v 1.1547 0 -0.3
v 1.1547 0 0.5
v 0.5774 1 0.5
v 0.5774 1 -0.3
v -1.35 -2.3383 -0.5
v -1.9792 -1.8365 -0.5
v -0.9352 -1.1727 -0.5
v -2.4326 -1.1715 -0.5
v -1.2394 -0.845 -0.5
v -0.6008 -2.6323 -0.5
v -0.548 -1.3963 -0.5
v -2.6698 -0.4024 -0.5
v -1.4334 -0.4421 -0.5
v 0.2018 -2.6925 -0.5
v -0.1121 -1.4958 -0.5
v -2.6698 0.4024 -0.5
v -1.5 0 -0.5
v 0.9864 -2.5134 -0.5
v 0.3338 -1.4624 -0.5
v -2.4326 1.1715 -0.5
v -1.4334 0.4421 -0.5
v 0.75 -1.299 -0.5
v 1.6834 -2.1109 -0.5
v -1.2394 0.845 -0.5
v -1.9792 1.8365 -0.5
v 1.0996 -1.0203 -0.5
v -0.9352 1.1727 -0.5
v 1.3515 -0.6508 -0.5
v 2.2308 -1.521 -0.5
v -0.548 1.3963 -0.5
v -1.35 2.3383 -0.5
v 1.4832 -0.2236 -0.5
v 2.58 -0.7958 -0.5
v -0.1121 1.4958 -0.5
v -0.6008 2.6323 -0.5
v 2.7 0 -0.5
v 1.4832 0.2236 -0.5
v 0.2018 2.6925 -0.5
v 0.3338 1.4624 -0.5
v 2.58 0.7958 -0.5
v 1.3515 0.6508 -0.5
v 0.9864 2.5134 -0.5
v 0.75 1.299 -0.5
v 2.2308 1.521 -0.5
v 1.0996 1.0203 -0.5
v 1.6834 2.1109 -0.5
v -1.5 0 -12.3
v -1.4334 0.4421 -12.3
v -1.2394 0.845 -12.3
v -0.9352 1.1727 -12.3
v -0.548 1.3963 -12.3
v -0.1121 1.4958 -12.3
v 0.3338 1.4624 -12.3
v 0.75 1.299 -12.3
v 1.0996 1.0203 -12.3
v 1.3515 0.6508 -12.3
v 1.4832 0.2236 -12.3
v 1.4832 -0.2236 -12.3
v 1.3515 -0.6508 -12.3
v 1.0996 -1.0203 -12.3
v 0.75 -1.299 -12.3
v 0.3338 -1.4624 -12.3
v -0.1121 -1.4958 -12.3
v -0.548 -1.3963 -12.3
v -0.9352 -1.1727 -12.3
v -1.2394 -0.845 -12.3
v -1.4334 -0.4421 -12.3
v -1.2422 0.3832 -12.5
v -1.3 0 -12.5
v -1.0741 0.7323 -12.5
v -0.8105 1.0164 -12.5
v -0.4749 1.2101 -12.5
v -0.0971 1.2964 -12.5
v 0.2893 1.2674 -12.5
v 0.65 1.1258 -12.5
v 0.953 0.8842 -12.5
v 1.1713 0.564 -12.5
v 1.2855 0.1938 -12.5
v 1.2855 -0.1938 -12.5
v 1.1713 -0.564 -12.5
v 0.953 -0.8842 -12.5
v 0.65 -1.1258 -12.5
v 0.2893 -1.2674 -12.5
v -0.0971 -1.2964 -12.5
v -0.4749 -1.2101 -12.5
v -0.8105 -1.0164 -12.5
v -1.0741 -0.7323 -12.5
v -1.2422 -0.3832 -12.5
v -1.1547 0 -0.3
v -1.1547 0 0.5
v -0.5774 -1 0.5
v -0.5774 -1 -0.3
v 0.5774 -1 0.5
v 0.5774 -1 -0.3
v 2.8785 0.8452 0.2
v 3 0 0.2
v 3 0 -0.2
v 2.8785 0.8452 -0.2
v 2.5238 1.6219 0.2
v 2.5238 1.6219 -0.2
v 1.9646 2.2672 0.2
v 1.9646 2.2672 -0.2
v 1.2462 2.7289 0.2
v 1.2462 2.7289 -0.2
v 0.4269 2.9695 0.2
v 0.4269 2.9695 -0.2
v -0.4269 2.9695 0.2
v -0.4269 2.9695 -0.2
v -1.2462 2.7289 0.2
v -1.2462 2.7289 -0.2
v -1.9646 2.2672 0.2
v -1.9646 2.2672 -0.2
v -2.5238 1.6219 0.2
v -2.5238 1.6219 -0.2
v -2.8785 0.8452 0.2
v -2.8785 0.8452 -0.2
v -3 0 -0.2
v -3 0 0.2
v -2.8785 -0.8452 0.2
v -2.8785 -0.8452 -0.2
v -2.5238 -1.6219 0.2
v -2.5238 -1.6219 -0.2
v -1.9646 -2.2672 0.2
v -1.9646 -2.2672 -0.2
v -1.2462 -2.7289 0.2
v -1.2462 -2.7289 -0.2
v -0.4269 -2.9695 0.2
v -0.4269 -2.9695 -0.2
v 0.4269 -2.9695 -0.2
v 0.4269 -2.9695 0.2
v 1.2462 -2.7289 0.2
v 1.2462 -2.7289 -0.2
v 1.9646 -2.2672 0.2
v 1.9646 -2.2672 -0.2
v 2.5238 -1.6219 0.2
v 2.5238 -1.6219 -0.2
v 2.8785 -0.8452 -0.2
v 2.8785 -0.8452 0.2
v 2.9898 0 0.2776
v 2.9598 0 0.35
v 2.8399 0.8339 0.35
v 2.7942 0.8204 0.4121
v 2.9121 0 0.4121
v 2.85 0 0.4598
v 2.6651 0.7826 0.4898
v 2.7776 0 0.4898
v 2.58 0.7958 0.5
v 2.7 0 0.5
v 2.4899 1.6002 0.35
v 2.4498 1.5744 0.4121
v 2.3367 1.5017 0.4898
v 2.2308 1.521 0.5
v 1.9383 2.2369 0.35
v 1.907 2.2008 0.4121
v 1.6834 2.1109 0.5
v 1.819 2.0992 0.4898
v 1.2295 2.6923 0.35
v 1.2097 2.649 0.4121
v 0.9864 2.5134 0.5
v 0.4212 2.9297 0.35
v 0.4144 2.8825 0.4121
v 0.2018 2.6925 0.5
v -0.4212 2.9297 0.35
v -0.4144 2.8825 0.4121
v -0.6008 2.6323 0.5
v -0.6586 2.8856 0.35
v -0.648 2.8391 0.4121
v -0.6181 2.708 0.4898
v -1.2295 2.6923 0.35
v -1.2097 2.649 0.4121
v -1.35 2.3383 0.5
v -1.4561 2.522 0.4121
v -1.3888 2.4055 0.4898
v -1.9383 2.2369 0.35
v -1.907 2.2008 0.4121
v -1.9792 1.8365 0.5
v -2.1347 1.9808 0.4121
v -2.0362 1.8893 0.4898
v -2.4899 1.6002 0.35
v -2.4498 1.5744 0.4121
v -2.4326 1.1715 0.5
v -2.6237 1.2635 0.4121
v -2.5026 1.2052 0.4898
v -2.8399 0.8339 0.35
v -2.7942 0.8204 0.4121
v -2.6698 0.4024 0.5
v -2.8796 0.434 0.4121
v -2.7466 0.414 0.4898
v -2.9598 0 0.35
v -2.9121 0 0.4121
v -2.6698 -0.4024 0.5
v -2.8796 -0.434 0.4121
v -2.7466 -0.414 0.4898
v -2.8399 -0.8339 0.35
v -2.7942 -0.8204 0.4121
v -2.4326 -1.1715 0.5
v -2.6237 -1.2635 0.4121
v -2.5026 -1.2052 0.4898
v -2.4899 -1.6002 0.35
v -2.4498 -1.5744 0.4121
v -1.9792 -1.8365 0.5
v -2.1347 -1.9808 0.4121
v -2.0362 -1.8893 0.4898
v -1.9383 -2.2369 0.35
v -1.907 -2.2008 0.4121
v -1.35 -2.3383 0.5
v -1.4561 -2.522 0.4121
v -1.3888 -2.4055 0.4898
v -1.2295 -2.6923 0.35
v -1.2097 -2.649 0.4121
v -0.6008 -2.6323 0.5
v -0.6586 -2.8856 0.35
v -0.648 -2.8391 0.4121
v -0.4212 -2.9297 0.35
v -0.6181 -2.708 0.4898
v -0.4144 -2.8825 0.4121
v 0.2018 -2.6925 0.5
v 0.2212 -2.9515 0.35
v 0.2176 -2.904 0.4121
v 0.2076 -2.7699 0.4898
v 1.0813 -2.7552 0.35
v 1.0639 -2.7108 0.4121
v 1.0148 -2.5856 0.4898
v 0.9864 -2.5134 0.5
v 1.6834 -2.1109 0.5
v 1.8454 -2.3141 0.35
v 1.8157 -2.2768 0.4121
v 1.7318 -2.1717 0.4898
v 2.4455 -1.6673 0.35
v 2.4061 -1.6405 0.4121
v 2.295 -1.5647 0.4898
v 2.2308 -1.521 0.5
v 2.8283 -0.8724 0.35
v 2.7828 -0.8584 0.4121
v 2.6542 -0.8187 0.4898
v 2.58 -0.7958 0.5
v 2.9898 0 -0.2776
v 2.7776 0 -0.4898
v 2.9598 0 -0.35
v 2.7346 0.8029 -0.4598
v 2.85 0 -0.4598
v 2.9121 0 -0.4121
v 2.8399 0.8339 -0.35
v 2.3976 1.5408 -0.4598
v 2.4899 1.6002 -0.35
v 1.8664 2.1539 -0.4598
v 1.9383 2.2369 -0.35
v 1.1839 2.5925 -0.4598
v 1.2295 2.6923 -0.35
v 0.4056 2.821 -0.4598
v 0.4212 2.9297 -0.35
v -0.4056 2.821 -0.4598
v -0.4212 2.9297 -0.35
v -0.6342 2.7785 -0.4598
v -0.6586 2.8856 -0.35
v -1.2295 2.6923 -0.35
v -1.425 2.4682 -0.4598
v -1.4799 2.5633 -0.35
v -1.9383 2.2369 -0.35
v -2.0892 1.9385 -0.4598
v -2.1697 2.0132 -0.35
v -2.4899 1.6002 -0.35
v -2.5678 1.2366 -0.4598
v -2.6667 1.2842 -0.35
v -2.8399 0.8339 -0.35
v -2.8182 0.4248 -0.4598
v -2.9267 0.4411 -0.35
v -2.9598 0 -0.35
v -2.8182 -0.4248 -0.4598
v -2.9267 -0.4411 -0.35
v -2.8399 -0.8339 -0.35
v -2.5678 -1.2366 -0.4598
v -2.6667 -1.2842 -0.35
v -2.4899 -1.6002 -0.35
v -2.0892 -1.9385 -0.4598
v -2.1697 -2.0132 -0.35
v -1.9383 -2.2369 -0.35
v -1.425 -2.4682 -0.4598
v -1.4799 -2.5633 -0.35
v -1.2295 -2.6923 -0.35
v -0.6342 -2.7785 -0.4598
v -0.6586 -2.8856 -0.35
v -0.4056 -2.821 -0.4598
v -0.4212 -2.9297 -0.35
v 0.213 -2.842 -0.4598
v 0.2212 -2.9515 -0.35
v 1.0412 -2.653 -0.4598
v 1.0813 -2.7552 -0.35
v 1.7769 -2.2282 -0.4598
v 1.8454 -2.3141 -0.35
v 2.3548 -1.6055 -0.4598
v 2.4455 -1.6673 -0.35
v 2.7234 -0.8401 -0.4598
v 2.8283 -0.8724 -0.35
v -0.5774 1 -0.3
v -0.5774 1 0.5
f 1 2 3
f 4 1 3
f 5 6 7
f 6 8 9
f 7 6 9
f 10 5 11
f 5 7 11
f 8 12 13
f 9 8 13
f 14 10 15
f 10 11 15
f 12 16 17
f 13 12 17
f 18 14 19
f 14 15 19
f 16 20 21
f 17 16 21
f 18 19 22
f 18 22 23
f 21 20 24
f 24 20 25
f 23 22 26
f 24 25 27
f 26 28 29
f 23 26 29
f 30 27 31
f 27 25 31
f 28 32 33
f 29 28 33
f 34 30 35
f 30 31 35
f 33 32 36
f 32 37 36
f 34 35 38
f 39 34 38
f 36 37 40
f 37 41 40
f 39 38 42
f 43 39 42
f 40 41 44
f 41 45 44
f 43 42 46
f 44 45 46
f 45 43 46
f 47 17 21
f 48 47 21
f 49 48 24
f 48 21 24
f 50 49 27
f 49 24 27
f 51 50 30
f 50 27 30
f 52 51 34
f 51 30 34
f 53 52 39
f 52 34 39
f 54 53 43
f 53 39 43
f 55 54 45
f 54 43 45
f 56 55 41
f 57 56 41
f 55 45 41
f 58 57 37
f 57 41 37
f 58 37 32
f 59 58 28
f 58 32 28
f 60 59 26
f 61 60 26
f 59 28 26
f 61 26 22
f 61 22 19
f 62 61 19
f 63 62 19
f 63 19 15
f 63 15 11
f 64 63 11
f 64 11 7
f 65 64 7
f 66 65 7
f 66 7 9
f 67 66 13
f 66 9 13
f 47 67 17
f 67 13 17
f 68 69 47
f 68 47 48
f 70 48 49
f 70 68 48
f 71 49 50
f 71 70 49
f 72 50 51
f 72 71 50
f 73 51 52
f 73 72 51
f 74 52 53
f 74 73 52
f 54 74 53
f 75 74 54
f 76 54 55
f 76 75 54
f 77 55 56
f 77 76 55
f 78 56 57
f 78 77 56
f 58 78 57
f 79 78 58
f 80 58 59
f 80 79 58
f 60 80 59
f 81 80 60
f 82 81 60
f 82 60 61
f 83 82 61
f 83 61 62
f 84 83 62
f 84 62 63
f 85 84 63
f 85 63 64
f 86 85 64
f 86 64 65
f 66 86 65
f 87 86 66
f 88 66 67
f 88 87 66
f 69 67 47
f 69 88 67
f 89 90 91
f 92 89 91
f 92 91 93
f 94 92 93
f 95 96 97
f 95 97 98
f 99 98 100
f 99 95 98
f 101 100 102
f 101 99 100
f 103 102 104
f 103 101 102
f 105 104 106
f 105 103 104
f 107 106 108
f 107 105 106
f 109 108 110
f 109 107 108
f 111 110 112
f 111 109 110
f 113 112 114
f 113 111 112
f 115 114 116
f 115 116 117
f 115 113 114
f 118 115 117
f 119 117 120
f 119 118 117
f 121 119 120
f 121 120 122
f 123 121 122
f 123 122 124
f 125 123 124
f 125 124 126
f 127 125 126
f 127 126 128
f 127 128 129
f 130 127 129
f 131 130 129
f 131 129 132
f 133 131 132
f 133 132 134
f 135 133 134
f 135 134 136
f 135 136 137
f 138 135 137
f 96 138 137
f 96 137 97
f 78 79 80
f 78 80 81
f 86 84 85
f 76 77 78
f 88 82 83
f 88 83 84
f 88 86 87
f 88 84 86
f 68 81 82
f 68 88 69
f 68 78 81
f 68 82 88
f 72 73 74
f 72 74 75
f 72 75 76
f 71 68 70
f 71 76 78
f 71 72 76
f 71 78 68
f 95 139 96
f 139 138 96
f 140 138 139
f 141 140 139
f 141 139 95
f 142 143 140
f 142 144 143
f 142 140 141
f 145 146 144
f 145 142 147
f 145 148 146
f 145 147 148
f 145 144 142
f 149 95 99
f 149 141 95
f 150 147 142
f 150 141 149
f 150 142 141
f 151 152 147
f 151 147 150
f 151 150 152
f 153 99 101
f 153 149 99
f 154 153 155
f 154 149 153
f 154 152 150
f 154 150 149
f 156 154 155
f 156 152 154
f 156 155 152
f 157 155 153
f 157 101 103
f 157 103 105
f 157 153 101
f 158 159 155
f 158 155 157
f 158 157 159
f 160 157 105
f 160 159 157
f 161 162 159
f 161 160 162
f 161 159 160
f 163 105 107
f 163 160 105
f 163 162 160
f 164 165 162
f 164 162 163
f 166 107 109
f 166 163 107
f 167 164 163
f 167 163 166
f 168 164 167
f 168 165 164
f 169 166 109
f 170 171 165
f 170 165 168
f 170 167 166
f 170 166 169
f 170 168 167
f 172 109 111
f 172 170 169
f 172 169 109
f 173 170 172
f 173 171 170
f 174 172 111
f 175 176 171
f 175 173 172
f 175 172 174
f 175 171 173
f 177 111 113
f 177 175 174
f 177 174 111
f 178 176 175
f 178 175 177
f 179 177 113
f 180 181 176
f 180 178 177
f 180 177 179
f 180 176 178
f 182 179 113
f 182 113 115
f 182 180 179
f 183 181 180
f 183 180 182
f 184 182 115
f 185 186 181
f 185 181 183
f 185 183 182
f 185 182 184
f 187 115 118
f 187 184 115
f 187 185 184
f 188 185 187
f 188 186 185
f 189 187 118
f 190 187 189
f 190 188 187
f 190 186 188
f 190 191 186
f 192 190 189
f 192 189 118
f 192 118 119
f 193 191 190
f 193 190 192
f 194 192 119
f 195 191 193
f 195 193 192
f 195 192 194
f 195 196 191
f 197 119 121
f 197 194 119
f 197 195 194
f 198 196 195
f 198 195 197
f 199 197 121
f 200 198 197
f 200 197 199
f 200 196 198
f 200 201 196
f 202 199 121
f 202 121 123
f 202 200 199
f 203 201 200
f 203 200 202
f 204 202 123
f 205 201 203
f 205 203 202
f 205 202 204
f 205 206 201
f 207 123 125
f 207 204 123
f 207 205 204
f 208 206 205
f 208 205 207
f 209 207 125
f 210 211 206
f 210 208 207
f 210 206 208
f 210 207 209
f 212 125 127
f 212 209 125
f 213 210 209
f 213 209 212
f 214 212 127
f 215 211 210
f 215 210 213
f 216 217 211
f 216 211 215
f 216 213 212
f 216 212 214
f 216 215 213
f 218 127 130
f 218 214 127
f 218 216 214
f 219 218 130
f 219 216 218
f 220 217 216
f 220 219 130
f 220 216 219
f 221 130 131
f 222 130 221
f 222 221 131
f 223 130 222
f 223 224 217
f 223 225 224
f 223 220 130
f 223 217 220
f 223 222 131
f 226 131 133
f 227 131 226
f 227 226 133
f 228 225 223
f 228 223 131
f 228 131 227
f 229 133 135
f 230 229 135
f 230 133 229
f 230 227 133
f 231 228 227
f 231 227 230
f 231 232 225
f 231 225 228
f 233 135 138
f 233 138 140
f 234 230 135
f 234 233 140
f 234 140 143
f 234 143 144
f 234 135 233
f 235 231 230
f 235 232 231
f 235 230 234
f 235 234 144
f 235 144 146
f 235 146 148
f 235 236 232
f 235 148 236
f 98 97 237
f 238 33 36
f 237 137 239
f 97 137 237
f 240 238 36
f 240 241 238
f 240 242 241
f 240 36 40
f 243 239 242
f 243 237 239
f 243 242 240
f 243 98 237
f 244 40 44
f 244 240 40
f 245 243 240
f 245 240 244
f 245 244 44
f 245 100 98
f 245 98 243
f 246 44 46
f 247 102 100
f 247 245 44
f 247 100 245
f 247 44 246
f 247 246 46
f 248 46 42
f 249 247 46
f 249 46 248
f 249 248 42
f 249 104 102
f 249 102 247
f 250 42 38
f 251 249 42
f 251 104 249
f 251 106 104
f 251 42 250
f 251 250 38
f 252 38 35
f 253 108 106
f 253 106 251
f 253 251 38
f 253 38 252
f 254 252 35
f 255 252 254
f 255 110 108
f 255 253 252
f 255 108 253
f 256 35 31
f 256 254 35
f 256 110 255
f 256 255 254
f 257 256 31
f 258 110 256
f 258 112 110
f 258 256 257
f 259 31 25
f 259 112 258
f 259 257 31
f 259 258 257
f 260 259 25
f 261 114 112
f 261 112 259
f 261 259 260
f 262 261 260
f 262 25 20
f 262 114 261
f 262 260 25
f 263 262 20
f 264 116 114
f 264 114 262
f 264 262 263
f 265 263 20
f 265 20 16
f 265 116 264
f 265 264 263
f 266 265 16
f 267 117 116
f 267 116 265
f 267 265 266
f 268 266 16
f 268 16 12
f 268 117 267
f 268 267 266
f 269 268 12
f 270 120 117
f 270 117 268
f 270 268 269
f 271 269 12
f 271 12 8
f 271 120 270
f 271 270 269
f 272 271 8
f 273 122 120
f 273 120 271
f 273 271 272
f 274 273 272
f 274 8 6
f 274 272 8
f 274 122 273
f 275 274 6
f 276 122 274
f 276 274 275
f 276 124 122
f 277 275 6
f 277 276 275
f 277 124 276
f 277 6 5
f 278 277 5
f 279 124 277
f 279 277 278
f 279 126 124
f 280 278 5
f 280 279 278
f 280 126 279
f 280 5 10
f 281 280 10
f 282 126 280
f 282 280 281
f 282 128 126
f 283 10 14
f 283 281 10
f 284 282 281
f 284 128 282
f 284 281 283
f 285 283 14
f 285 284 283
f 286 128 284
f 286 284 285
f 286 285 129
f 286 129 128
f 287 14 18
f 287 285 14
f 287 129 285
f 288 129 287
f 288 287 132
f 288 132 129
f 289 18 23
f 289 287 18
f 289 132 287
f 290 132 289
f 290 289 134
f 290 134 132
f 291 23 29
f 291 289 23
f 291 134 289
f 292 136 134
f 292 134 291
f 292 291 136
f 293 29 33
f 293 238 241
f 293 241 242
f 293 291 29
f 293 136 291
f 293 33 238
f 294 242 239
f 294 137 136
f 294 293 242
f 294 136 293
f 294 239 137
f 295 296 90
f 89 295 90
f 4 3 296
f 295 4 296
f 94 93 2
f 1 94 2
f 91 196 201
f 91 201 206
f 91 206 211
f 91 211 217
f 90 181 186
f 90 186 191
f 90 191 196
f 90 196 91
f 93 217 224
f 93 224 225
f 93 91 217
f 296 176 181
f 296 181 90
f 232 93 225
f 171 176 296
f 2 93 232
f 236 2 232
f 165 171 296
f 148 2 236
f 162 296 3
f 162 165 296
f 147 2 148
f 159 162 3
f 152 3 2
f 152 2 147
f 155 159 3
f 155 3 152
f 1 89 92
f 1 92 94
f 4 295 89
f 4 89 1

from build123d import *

# Parameters (mm, degrees)
SKETCH_1_R          = 3
EXTRUDE_1_DEPTH     = 0.5
SKETCH_2_R          = 1.5
EXTRUDE_2_DEPTH     = 12
CHAMFER_1_SIZE      = 0.2
CUT_EXTRUDE_1_DEPTH = 0.8
FILLET_2_R          = 0.3


with BuildPart() as part:
    # 草图1 → 凸台-拉伸1 (new body, symmetric)
    with BuildSketch(Plane.XY):
        Circle(SKETCH_1_R)
    extrude(amount=EXTRUDE_1_DEPTH, both=True)

    # 草图2 → 凸台-拉伸2 (add)
    with BuildSketch(Plane(origin=(0, 0, -0.5), x_dir=(-1, 0, 0), z_dir=(0, 0, -1))):
        Circle(SKETCH_2_R)
    extrude(amount=EXTRUDE_2_DEPTH)

    # 倒角1
    chamfer_1_edges = [part.edges().sort_by_distance(p)[0] for p in [
        (1.5, 0, -12.5),
    ]]
    chamfer(chamfer_1_edges, length=CHAMFER_1_SIZE)

    # 草图3 → 切除-拉伸1 (cut)
    with BuildSketch(Plane.XY.offset(0.5)):
        Polygon((1.154700538, 0), (0.577350269, 1), (-0.577350269, 1), (-1.154700538, 0), (-0.577350269, -1), (0.577350269, -1), align=None)
    extrude(amount=-CUT_EXTRUDE_1_DEPTH, mode=Mode.SUBTRACT)

    # 圆角2
    fillet_2_edges = [part.edges().sort_by_distance(p)[0] for p in [
        (-3, 0, -0.5),
        (-3, 0, 0.5),
    ]]
    fillet(fillet_2_edges, radius=FILLET_2_R)


solid = part.part
